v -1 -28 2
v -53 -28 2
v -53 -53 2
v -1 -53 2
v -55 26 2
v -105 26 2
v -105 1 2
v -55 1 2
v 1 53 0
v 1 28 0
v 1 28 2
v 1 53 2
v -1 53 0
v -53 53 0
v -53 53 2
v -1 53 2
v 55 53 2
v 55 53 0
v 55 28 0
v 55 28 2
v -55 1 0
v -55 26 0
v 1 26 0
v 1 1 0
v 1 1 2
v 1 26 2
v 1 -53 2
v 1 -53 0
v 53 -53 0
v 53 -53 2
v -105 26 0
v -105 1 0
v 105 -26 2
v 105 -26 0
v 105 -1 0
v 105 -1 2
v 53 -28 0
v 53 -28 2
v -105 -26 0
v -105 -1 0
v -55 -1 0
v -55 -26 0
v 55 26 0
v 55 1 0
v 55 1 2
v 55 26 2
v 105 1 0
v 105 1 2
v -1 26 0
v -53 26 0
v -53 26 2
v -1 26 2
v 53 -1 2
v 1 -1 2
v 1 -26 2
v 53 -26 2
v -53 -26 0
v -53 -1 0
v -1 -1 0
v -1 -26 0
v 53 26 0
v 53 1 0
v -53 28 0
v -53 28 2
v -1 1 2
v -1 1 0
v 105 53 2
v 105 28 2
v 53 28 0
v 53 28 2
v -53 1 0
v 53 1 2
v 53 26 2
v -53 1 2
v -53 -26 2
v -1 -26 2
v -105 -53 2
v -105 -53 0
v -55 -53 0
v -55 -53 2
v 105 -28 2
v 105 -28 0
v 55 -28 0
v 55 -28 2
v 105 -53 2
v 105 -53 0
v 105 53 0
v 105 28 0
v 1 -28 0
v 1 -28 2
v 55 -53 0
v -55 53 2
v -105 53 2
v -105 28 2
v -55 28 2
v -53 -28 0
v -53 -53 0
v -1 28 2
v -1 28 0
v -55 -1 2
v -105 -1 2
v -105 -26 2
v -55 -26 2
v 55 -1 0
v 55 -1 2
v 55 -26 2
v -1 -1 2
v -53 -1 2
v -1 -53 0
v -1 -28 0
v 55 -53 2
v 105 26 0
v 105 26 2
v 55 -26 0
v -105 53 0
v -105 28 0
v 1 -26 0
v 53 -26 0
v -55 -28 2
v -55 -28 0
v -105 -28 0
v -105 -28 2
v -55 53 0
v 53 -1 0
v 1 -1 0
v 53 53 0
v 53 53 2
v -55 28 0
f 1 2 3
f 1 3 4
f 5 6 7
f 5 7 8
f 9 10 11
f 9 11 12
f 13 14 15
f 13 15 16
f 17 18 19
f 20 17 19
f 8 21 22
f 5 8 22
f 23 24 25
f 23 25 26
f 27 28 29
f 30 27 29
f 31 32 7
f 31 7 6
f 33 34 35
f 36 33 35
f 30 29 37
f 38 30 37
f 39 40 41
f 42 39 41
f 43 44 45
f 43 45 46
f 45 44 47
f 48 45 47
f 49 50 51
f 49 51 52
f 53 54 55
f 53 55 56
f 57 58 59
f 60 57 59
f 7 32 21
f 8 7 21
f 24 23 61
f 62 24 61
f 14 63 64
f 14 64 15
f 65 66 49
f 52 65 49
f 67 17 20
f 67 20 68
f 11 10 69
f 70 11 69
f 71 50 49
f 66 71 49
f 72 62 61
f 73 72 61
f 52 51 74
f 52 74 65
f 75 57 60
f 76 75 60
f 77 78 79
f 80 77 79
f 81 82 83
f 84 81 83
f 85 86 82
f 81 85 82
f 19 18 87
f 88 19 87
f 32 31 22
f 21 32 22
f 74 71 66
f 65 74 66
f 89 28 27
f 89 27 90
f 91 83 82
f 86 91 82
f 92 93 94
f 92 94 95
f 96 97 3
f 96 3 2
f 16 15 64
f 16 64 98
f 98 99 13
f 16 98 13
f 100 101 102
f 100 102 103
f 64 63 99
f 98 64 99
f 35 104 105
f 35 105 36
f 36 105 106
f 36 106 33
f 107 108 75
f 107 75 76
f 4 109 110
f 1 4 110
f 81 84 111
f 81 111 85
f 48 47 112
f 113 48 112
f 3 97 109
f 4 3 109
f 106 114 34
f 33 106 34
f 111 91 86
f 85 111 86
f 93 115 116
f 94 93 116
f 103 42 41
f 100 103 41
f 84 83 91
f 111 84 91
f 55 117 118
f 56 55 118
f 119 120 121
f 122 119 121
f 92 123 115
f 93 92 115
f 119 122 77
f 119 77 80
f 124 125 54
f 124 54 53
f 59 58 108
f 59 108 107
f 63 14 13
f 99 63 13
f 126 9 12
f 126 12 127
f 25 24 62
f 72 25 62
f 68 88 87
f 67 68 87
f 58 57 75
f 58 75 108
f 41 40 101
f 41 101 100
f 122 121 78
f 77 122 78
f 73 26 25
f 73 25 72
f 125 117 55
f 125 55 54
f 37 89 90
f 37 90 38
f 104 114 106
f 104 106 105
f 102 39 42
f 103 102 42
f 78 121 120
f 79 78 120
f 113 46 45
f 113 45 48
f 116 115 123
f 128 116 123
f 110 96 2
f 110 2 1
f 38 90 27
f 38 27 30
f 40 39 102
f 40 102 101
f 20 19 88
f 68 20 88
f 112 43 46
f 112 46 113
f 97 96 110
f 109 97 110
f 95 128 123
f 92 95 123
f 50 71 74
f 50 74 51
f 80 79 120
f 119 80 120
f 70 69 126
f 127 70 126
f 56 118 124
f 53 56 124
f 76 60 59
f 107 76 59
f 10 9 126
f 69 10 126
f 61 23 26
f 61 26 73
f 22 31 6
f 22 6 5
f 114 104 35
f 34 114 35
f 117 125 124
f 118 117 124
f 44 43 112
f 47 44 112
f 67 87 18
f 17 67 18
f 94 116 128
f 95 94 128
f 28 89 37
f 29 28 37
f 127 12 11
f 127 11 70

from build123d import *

# Parameters (mm, degrees)
F0_W     = 52
F0_H     = 25
F0_W_2   = 50
F1_DEPTH = 2


with BuildPart() as f1:
    # F0 (on Top) → F1 (new body)
    with BuildSketch(Plane.XY):
        Polygon((-55, 53), (-105, 53), (-105, 30), (-105, 28), (-55, 28), align=None)
        with Locations((-27, 40.5)):
            Rectangle(F0_W, F0_H)
        with Locations((27, 40.5)):
            Rectangle(F0_W, F0_H)
        with Locations((27, 13.5)):
            Rectangle(F0_W, F0_H)
        with Locations((-27, 13.5)):
            Rectangle(F0_W, F0_H)
        with Locations((-80, 13.5)):
            Rectangle(F0_W_2, F0_H)
        with Locations((-80, -13.5)):
            Rectangle(F0_W_2, F0_H)
        with Locations((-27, -13.5)):
            Rectangle(F0_W, F0_H)
        with Locations((27, -13.5)):
            Rectangle(F0_W, F0_H)
        Polygon((105, 53), (55, 53), (55, 28), (105, 28), (105, 30), align=None)
        with Locations((80, 13.5)):
            Rectangle(F0_W_2, F0_H)
        with Locations((80, -13.5)):
            Rectangle(F0_W_2, F0_H)
        Polygon((55, -28), (55, -53), (105, -53), (105, -30), (105, -28), align=None)
        with Locations((27, -40.5)):
            Rectangle(F0_W, F0_H)
        with Locations((-27, -40.5)):
            Rectangle(F0_W, F0_H)
        Polygon((-55, -28), (-105, -28), (-105, -30), (-105, -53), (-55, -53), align=None)
    extrude(amount=F1_DEPTH)


solid = f1.part
